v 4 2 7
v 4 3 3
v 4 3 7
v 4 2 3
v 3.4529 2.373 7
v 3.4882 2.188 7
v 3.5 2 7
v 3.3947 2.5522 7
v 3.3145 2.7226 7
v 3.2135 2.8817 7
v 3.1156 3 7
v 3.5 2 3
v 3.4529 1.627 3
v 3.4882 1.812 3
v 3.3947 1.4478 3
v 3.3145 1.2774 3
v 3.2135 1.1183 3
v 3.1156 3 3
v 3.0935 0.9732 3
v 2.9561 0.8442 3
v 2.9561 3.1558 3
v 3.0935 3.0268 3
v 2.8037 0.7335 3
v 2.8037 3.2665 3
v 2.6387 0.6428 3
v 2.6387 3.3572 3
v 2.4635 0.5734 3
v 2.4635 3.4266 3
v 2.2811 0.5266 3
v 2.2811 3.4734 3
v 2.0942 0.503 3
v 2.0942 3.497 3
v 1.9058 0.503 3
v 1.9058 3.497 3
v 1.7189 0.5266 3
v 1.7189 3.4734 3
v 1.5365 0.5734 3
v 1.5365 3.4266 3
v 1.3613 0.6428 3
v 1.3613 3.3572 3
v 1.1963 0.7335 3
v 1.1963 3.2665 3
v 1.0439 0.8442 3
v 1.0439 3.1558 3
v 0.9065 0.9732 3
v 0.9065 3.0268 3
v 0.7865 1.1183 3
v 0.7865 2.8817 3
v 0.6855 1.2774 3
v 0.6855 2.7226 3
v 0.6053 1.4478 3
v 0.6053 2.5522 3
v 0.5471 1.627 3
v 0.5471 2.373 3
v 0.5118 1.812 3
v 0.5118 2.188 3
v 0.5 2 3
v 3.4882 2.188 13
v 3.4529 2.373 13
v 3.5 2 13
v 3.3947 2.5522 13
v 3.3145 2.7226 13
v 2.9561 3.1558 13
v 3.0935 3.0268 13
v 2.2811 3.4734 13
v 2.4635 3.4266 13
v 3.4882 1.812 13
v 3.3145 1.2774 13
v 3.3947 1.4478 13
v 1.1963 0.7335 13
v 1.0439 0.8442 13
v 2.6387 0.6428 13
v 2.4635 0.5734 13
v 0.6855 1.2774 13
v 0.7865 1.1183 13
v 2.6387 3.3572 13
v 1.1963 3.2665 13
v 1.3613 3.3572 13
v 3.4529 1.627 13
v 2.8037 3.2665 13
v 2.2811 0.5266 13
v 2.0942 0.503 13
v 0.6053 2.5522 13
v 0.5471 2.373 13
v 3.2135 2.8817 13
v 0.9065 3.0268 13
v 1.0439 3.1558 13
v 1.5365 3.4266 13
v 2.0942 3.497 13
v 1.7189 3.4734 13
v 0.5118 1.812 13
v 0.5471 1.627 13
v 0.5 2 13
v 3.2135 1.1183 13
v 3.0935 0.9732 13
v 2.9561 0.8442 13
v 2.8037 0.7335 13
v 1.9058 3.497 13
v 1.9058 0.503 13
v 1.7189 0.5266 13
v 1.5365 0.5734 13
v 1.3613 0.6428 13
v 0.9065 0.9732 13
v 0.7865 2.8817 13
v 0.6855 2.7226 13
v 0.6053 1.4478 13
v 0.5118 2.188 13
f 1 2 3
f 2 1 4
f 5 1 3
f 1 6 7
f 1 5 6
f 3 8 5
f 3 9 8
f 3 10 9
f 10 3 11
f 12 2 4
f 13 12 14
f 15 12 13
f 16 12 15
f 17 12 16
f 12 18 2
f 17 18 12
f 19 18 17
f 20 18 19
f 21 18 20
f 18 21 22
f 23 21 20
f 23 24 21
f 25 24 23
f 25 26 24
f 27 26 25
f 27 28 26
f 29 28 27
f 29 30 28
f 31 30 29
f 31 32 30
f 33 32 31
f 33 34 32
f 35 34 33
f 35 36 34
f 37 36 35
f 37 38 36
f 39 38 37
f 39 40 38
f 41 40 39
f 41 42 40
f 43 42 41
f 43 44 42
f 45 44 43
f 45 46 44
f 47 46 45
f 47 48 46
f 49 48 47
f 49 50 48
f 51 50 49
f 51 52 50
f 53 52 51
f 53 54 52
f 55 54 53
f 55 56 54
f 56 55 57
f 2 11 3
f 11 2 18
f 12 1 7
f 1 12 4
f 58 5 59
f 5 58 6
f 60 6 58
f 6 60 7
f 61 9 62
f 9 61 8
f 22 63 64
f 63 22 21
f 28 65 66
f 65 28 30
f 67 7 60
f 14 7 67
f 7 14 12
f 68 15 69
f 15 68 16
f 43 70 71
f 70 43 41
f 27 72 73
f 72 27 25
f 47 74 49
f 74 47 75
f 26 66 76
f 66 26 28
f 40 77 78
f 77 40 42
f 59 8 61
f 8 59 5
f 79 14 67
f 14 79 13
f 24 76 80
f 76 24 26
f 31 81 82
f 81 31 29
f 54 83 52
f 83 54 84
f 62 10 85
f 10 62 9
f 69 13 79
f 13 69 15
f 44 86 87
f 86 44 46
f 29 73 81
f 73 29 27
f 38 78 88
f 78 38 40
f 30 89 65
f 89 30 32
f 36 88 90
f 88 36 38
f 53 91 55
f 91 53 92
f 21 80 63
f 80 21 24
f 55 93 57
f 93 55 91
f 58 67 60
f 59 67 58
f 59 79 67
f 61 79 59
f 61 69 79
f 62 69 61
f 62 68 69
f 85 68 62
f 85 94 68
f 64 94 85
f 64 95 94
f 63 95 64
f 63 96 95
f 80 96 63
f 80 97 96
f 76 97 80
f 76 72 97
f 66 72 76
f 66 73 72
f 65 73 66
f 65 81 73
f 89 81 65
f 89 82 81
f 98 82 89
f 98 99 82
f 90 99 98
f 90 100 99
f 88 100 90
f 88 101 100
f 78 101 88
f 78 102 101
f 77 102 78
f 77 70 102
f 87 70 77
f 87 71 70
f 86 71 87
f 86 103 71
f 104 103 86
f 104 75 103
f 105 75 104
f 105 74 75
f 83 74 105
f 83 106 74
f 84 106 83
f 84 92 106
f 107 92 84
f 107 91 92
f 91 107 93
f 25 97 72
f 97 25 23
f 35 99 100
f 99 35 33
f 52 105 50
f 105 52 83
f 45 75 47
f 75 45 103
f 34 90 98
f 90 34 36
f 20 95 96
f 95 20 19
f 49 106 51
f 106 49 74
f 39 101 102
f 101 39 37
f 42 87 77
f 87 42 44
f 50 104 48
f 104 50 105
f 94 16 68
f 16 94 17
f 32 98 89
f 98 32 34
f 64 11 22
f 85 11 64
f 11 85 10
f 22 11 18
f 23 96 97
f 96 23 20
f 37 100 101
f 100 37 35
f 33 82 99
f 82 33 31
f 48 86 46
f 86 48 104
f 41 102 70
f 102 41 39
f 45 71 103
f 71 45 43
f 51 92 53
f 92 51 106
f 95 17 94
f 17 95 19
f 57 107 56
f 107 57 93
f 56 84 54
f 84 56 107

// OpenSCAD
$fn=50;
translate([2,2,3])
{
	cube([2,1,4]);
	cylinder(h=10,d=3);
}
